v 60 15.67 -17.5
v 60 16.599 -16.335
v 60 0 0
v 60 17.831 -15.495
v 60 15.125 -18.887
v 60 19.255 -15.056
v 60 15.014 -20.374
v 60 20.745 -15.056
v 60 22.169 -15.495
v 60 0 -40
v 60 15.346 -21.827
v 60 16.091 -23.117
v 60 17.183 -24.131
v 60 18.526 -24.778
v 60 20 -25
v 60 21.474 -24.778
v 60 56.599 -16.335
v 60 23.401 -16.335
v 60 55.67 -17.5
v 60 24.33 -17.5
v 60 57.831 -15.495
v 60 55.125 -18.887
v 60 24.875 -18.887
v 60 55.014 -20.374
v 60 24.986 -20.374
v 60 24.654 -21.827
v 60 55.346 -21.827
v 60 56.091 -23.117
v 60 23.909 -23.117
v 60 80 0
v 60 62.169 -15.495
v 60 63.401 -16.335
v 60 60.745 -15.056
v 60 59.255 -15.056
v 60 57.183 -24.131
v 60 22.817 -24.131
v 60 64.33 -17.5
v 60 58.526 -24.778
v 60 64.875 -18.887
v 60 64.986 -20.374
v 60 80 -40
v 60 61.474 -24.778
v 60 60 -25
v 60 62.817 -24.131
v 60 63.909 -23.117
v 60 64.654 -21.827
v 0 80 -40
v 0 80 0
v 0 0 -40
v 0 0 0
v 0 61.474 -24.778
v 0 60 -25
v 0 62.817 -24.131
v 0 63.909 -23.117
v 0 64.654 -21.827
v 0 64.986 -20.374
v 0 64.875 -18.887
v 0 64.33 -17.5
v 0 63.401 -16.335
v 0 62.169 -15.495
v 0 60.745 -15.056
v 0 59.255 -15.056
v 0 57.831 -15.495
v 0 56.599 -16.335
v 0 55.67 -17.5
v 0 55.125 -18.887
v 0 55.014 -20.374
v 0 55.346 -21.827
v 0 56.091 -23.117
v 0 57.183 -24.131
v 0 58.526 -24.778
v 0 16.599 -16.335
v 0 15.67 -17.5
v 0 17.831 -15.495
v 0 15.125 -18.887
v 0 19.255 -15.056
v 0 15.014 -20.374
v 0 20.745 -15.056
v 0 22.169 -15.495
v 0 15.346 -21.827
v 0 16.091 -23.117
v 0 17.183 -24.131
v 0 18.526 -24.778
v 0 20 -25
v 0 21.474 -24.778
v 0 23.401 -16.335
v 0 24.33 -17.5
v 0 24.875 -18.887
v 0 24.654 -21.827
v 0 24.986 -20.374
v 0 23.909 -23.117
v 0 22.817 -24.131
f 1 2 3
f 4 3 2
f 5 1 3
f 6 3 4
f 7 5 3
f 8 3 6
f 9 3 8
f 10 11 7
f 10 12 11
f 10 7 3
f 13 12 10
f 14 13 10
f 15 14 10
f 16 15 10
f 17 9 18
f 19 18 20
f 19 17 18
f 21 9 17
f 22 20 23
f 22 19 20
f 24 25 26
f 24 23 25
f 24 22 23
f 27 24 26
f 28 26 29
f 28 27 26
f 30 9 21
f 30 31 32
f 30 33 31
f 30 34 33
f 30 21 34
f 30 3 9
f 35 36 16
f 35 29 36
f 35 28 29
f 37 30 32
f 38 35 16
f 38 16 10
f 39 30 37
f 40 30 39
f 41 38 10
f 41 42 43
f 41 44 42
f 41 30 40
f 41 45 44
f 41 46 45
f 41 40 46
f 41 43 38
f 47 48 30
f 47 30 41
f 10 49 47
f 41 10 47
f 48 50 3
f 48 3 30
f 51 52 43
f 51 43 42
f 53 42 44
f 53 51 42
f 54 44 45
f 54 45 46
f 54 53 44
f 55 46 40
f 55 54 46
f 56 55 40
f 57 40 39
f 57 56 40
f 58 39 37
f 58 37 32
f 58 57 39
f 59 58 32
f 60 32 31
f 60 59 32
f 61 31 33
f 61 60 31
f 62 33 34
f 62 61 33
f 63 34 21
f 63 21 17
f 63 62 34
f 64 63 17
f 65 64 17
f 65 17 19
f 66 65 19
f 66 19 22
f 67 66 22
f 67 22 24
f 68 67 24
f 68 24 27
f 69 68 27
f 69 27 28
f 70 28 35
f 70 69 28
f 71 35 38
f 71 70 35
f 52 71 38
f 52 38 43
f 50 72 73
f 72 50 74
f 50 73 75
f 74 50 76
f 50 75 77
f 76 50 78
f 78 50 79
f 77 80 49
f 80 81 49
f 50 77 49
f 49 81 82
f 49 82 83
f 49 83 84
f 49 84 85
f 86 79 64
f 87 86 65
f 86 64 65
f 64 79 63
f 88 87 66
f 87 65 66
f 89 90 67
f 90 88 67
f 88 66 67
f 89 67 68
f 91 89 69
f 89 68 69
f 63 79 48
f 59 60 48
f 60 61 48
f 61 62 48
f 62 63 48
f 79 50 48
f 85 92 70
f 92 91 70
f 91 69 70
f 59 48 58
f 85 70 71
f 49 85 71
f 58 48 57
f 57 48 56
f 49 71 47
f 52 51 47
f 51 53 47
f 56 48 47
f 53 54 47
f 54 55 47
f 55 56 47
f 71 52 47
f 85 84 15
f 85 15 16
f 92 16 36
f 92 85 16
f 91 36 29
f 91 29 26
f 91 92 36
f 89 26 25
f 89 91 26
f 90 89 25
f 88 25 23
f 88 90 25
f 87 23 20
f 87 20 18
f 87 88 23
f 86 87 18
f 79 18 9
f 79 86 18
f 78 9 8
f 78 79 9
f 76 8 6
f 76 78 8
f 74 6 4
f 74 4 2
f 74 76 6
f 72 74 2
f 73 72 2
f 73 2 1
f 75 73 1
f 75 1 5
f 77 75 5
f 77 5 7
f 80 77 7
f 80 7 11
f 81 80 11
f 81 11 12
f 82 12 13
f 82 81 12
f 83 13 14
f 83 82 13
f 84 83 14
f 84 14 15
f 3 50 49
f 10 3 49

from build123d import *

# Parameters (mm, degrees)
SKETCH_1_W      = 40
SKETCH_1_H      = 80
SKETCH_1_R      = 5
EXTRUDE_1_DEPTH = 60


with BuildPart() as part:
    # Эскиз1 → Бобышка-Вытянуть1 (new body)
    with BuildSketch(Plane(origin=(0, 0, 0), x_dir=(0, 0, -1), z_dir=(1, 0, 0))):
        with Locations((20, 40)):
            Rectangle(SKETCH_1_W, SKETCH_1_H)
        with Locations((20, 60)):
            Circle(SKETCH_1_R, mode=Mode.SUBTRACT)
        with Locations((20, 20)):
            Circle(SKETCH_1_R, mode=Mode.SUBTRACT)
    extrude(amount=EXTRUDE_1_DEPTH)


solid = part.part
